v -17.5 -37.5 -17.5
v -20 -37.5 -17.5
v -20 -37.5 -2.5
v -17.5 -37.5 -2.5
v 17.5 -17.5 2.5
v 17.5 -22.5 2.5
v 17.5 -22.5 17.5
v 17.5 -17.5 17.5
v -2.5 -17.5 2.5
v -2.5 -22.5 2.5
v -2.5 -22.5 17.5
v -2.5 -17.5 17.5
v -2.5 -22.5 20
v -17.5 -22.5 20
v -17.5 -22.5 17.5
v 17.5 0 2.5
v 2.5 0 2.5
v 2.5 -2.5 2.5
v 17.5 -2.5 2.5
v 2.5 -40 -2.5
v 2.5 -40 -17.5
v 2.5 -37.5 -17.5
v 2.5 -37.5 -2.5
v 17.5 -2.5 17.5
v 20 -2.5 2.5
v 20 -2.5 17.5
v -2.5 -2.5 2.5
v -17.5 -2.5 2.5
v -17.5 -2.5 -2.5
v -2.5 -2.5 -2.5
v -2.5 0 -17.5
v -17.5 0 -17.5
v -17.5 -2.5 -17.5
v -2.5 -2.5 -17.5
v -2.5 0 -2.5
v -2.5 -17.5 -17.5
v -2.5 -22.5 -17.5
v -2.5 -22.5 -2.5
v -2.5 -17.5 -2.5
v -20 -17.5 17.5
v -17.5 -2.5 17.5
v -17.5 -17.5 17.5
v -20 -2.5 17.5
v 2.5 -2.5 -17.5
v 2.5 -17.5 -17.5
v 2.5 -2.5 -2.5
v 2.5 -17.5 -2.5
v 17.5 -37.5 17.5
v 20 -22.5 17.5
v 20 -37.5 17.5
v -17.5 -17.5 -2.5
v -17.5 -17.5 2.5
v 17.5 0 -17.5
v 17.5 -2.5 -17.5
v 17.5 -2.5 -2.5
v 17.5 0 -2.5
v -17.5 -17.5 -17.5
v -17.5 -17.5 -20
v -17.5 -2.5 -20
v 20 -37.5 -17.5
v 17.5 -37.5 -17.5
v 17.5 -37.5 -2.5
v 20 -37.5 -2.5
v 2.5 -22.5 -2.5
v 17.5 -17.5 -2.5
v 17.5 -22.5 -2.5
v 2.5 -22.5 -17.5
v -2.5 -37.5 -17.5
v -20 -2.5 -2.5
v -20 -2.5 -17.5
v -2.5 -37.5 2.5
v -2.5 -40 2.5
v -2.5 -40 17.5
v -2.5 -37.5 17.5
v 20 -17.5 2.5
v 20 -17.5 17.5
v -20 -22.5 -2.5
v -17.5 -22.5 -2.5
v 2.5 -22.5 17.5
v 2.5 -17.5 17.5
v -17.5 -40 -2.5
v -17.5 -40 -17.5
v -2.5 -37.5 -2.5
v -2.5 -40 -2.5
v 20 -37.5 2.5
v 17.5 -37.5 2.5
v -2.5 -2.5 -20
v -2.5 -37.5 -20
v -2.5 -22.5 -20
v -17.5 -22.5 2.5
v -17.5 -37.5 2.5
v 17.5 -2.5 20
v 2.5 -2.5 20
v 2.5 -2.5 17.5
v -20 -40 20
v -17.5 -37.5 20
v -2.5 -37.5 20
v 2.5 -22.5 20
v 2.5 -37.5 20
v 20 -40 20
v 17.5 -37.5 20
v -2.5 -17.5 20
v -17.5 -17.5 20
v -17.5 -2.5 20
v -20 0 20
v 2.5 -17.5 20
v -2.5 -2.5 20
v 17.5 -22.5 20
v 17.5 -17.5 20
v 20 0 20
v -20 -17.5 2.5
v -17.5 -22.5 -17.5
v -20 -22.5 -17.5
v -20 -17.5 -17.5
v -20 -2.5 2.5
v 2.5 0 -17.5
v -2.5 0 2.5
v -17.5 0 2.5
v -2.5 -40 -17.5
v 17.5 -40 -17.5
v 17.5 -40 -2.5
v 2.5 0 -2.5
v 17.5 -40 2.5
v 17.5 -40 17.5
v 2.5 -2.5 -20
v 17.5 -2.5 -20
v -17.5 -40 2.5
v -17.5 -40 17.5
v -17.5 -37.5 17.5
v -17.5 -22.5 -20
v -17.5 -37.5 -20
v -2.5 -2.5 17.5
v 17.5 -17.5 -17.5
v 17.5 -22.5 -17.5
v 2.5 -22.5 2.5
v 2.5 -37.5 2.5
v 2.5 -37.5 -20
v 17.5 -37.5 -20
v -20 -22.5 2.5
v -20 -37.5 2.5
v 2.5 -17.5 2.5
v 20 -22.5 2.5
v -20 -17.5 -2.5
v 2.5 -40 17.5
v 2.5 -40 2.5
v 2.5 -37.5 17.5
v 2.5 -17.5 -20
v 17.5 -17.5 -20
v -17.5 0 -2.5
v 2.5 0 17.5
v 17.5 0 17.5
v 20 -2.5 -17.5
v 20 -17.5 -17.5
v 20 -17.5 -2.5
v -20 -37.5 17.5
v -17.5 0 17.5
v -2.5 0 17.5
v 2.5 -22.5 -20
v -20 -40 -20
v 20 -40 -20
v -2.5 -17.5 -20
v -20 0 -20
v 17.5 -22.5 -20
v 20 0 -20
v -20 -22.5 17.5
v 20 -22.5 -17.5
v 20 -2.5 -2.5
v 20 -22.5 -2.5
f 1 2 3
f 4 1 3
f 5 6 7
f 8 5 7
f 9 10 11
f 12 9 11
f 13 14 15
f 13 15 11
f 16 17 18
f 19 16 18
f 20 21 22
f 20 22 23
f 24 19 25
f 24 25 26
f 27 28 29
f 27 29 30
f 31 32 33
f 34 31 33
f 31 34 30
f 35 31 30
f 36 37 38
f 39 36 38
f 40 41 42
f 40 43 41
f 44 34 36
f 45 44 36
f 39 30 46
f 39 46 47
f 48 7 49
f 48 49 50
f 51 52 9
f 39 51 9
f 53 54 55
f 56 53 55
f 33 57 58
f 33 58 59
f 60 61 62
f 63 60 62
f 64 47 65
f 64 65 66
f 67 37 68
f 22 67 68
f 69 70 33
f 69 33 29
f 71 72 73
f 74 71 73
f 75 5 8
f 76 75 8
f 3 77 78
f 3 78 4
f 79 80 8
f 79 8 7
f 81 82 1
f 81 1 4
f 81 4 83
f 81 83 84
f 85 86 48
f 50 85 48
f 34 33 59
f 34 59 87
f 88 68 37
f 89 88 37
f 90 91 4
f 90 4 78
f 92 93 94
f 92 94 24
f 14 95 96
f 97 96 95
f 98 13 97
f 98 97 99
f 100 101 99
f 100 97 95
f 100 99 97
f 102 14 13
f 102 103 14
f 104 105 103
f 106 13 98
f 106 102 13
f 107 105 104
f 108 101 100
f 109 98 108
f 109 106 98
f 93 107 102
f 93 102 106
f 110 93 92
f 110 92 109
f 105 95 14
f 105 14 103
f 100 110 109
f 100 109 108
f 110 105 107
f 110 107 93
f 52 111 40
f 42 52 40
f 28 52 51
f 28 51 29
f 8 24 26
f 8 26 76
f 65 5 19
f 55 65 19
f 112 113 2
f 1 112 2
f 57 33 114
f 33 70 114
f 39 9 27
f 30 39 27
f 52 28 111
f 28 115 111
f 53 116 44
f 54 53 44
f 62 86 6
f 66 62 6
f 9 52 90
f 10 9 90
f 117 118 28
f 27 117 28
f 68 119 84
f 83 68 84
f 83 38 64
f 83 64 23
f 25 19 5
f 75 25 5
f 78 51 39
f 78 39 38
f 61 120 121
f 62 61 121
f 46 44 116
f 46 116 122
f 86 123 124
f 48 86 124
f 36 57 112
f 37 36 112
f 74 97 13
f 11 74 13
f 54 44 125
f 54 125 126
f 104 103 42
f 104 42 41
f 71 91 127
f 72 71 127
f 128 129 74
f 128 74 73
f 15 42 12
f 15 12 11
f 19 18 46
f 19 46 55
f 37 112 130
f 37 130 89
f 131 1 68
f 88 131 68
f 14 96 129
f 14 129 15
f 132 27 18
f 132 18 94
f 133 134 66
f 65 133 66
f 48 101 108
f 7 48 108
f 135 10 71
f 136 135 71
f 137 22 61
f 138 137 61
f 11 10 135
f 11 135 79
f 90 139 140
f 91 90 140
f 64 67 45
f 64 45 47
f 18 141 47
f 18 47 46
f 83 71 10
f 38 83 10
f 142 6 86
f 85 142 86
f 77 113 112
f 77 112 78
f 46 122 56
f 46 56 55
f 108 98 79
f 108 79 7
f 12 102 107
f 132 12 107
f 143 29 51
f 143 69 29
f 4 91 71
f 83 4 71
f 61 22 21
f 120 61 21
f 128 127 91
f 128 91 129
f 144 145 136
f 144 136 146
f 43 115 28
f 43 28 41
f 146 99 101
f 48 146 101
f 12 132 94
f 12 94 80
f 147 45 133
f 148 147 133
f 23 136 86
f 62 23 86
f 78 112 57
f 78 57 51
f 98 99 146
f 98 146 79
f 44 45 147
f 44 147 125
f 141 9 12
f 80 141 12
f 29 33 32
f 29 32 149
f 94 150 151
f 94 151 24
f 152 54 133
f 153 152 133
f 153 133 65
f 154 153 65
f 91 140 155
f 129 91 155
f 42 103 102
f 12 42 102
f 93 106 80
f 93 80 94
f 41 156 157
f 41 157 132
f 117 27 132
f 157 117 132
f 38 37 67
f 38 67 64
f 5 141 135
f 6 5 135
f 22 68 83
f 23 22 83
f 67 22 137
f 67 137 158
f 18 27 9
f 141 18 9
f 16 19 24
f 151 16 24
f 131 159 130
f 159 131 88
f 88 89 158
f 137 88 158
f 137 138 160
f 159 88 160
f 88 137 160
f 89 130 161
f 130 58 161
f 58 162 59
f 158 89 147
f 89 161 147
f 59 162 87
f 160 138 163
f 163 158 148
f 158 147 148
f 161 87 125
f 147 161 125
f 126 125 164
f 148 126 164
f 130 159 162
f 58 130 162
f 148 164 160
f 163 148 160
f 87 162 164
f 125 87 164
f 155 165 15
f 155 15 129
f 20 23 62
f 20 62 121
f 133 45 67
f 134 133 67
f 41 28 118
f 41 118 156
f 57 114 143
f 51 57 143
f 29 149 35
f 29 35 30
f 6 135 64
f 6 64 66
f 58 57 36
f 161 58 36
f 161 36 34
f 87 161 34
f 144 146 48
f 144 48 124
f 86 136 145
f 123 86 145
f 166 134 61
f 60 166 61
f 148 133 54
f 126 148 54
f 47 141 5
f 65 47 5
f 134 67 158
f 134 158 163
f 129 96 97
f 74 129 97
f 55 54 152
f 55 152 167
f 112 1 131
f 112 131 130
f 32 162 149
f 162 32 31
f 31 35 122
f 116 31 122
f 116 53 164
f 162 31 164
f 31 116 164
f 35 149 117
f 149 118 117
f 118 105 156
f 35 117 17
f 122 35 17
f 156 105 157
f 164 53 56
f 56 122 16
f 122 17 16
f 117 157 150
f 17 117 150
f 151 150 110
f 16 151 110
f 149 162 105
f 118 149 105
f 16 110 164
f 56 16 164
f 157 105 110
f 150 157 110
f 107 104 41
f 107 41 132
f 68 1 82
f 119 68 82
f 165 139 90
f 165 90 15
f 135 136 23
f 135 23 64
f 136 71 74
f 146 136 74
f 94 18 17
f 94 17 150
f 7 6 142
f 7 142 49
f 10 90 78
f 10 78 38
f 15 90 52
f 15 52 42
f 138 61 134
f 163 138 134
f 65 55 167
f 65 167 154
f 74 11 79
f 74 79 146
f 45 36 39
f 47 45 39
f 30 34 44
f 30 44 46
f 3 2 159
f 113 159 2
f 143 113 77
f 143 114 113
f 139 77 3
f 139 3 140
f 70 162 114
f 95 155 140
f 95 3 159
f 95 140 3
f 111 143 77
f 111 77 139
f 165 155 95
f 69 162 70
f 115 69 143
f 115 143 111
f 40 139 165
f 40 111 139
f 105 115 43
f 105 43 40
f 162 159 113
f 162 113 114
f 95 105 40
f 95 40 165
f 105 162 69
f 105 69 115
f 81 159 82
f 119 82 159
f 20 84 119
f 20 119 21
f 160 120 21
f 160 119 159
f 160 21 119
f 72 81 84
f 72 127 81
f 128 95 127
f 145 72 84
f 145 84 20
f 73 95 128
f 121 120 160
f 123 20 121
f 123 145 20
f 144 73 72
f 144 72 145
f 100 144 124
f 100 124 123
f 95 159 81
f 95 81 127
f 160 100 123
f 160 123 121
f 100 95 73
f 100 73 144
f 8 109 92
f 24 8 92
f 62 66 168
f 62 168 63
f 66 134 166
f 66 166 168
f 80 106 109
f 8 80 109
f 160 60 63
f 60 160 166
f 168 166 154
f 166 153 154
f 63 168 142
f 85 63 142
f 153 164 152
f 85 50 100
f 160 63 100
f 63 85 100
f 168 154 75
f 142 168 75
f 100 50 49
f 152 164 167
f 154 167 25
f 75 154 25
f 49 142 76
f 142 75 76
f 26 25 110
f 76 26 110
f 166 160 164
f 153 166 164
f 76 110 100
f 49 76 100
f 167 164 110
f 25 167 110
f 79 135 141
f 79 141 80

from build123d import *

# Parameters (mm, degrees)
F0_W     = 40
F0_H     = 40
F1_DEPTH = 40
F2_W     = 15
F2_H     = 15
F3_DEPTH = 40.001
F4_W     = 15
F4_H     = 15
F5_DEPTH = 40.001
F6_W     = 15
F6_H     = 15
F7_DEPTH = 40.001


with BuildPart() as f1:
    # F0 (on Front) → F1 (new body)
    with BuildSketch(Plane.XZ):
        Rectangle(F0_W, F0_H)
    extrude(amount=F1_DEPTH)

    # F2 (on face) → F3 (cut, through all)
    with BuildSketch(Plane.XZ.offset(40)):
        with Locations((-10, 10)):
            Rectangle(F2_W, F2_H)
        with Locations((10, 10)):
            Rectangle(F2_W, F2_H)
        with Locations((-10, -10)):
            Rectangle(F2_W, F2_H)
        with Locations((10, -10)):
            Rectangle(F2_W, F2_H)
    extrude(amount=-F3_DEPTH, mode=Mode.SUBTRACT)

    # F4 (on face) → F5 (cut, through all)
    with BuildSketch(Plane(origin=(-20, 0, 0), x_dir=(0, -1, 0), z_dir=(-1, 0, 0))):
        with Locations((10, 10)):
            Rectangle(F4_W, F4_H)
        with Locations((30, 10)):
            Rectangle(F4_W, F4_H)
        with Locations((10, -10)):
            Rectangle(F4_W, F4_H)
        with Locations((30, -10)):
            Rectangle(F4_W, F4_H)
    extrude(amount=-F5_DEPTH, mode=Mode.SUBTRACT)

    # F6 (on face) → F7 (cut, through all)
    with BuildSketch(Plane.XY.offset(20)):
        with Locations((-10, -10)):
            Rectangle(F6_W, F6_H)
        with Locations((10, -10)):
            Rectangle(F6_W, F6_H)
        with Locations((-10, -30)):
            Rectangle(F6_W, F6_H)
        with Locations((10, -30)):
            Rectangle(F6_W, F6_H)
    extrude(amount=-F7_DEPTH, mode=Mode.SUBTRACT)


solid = f1.part
